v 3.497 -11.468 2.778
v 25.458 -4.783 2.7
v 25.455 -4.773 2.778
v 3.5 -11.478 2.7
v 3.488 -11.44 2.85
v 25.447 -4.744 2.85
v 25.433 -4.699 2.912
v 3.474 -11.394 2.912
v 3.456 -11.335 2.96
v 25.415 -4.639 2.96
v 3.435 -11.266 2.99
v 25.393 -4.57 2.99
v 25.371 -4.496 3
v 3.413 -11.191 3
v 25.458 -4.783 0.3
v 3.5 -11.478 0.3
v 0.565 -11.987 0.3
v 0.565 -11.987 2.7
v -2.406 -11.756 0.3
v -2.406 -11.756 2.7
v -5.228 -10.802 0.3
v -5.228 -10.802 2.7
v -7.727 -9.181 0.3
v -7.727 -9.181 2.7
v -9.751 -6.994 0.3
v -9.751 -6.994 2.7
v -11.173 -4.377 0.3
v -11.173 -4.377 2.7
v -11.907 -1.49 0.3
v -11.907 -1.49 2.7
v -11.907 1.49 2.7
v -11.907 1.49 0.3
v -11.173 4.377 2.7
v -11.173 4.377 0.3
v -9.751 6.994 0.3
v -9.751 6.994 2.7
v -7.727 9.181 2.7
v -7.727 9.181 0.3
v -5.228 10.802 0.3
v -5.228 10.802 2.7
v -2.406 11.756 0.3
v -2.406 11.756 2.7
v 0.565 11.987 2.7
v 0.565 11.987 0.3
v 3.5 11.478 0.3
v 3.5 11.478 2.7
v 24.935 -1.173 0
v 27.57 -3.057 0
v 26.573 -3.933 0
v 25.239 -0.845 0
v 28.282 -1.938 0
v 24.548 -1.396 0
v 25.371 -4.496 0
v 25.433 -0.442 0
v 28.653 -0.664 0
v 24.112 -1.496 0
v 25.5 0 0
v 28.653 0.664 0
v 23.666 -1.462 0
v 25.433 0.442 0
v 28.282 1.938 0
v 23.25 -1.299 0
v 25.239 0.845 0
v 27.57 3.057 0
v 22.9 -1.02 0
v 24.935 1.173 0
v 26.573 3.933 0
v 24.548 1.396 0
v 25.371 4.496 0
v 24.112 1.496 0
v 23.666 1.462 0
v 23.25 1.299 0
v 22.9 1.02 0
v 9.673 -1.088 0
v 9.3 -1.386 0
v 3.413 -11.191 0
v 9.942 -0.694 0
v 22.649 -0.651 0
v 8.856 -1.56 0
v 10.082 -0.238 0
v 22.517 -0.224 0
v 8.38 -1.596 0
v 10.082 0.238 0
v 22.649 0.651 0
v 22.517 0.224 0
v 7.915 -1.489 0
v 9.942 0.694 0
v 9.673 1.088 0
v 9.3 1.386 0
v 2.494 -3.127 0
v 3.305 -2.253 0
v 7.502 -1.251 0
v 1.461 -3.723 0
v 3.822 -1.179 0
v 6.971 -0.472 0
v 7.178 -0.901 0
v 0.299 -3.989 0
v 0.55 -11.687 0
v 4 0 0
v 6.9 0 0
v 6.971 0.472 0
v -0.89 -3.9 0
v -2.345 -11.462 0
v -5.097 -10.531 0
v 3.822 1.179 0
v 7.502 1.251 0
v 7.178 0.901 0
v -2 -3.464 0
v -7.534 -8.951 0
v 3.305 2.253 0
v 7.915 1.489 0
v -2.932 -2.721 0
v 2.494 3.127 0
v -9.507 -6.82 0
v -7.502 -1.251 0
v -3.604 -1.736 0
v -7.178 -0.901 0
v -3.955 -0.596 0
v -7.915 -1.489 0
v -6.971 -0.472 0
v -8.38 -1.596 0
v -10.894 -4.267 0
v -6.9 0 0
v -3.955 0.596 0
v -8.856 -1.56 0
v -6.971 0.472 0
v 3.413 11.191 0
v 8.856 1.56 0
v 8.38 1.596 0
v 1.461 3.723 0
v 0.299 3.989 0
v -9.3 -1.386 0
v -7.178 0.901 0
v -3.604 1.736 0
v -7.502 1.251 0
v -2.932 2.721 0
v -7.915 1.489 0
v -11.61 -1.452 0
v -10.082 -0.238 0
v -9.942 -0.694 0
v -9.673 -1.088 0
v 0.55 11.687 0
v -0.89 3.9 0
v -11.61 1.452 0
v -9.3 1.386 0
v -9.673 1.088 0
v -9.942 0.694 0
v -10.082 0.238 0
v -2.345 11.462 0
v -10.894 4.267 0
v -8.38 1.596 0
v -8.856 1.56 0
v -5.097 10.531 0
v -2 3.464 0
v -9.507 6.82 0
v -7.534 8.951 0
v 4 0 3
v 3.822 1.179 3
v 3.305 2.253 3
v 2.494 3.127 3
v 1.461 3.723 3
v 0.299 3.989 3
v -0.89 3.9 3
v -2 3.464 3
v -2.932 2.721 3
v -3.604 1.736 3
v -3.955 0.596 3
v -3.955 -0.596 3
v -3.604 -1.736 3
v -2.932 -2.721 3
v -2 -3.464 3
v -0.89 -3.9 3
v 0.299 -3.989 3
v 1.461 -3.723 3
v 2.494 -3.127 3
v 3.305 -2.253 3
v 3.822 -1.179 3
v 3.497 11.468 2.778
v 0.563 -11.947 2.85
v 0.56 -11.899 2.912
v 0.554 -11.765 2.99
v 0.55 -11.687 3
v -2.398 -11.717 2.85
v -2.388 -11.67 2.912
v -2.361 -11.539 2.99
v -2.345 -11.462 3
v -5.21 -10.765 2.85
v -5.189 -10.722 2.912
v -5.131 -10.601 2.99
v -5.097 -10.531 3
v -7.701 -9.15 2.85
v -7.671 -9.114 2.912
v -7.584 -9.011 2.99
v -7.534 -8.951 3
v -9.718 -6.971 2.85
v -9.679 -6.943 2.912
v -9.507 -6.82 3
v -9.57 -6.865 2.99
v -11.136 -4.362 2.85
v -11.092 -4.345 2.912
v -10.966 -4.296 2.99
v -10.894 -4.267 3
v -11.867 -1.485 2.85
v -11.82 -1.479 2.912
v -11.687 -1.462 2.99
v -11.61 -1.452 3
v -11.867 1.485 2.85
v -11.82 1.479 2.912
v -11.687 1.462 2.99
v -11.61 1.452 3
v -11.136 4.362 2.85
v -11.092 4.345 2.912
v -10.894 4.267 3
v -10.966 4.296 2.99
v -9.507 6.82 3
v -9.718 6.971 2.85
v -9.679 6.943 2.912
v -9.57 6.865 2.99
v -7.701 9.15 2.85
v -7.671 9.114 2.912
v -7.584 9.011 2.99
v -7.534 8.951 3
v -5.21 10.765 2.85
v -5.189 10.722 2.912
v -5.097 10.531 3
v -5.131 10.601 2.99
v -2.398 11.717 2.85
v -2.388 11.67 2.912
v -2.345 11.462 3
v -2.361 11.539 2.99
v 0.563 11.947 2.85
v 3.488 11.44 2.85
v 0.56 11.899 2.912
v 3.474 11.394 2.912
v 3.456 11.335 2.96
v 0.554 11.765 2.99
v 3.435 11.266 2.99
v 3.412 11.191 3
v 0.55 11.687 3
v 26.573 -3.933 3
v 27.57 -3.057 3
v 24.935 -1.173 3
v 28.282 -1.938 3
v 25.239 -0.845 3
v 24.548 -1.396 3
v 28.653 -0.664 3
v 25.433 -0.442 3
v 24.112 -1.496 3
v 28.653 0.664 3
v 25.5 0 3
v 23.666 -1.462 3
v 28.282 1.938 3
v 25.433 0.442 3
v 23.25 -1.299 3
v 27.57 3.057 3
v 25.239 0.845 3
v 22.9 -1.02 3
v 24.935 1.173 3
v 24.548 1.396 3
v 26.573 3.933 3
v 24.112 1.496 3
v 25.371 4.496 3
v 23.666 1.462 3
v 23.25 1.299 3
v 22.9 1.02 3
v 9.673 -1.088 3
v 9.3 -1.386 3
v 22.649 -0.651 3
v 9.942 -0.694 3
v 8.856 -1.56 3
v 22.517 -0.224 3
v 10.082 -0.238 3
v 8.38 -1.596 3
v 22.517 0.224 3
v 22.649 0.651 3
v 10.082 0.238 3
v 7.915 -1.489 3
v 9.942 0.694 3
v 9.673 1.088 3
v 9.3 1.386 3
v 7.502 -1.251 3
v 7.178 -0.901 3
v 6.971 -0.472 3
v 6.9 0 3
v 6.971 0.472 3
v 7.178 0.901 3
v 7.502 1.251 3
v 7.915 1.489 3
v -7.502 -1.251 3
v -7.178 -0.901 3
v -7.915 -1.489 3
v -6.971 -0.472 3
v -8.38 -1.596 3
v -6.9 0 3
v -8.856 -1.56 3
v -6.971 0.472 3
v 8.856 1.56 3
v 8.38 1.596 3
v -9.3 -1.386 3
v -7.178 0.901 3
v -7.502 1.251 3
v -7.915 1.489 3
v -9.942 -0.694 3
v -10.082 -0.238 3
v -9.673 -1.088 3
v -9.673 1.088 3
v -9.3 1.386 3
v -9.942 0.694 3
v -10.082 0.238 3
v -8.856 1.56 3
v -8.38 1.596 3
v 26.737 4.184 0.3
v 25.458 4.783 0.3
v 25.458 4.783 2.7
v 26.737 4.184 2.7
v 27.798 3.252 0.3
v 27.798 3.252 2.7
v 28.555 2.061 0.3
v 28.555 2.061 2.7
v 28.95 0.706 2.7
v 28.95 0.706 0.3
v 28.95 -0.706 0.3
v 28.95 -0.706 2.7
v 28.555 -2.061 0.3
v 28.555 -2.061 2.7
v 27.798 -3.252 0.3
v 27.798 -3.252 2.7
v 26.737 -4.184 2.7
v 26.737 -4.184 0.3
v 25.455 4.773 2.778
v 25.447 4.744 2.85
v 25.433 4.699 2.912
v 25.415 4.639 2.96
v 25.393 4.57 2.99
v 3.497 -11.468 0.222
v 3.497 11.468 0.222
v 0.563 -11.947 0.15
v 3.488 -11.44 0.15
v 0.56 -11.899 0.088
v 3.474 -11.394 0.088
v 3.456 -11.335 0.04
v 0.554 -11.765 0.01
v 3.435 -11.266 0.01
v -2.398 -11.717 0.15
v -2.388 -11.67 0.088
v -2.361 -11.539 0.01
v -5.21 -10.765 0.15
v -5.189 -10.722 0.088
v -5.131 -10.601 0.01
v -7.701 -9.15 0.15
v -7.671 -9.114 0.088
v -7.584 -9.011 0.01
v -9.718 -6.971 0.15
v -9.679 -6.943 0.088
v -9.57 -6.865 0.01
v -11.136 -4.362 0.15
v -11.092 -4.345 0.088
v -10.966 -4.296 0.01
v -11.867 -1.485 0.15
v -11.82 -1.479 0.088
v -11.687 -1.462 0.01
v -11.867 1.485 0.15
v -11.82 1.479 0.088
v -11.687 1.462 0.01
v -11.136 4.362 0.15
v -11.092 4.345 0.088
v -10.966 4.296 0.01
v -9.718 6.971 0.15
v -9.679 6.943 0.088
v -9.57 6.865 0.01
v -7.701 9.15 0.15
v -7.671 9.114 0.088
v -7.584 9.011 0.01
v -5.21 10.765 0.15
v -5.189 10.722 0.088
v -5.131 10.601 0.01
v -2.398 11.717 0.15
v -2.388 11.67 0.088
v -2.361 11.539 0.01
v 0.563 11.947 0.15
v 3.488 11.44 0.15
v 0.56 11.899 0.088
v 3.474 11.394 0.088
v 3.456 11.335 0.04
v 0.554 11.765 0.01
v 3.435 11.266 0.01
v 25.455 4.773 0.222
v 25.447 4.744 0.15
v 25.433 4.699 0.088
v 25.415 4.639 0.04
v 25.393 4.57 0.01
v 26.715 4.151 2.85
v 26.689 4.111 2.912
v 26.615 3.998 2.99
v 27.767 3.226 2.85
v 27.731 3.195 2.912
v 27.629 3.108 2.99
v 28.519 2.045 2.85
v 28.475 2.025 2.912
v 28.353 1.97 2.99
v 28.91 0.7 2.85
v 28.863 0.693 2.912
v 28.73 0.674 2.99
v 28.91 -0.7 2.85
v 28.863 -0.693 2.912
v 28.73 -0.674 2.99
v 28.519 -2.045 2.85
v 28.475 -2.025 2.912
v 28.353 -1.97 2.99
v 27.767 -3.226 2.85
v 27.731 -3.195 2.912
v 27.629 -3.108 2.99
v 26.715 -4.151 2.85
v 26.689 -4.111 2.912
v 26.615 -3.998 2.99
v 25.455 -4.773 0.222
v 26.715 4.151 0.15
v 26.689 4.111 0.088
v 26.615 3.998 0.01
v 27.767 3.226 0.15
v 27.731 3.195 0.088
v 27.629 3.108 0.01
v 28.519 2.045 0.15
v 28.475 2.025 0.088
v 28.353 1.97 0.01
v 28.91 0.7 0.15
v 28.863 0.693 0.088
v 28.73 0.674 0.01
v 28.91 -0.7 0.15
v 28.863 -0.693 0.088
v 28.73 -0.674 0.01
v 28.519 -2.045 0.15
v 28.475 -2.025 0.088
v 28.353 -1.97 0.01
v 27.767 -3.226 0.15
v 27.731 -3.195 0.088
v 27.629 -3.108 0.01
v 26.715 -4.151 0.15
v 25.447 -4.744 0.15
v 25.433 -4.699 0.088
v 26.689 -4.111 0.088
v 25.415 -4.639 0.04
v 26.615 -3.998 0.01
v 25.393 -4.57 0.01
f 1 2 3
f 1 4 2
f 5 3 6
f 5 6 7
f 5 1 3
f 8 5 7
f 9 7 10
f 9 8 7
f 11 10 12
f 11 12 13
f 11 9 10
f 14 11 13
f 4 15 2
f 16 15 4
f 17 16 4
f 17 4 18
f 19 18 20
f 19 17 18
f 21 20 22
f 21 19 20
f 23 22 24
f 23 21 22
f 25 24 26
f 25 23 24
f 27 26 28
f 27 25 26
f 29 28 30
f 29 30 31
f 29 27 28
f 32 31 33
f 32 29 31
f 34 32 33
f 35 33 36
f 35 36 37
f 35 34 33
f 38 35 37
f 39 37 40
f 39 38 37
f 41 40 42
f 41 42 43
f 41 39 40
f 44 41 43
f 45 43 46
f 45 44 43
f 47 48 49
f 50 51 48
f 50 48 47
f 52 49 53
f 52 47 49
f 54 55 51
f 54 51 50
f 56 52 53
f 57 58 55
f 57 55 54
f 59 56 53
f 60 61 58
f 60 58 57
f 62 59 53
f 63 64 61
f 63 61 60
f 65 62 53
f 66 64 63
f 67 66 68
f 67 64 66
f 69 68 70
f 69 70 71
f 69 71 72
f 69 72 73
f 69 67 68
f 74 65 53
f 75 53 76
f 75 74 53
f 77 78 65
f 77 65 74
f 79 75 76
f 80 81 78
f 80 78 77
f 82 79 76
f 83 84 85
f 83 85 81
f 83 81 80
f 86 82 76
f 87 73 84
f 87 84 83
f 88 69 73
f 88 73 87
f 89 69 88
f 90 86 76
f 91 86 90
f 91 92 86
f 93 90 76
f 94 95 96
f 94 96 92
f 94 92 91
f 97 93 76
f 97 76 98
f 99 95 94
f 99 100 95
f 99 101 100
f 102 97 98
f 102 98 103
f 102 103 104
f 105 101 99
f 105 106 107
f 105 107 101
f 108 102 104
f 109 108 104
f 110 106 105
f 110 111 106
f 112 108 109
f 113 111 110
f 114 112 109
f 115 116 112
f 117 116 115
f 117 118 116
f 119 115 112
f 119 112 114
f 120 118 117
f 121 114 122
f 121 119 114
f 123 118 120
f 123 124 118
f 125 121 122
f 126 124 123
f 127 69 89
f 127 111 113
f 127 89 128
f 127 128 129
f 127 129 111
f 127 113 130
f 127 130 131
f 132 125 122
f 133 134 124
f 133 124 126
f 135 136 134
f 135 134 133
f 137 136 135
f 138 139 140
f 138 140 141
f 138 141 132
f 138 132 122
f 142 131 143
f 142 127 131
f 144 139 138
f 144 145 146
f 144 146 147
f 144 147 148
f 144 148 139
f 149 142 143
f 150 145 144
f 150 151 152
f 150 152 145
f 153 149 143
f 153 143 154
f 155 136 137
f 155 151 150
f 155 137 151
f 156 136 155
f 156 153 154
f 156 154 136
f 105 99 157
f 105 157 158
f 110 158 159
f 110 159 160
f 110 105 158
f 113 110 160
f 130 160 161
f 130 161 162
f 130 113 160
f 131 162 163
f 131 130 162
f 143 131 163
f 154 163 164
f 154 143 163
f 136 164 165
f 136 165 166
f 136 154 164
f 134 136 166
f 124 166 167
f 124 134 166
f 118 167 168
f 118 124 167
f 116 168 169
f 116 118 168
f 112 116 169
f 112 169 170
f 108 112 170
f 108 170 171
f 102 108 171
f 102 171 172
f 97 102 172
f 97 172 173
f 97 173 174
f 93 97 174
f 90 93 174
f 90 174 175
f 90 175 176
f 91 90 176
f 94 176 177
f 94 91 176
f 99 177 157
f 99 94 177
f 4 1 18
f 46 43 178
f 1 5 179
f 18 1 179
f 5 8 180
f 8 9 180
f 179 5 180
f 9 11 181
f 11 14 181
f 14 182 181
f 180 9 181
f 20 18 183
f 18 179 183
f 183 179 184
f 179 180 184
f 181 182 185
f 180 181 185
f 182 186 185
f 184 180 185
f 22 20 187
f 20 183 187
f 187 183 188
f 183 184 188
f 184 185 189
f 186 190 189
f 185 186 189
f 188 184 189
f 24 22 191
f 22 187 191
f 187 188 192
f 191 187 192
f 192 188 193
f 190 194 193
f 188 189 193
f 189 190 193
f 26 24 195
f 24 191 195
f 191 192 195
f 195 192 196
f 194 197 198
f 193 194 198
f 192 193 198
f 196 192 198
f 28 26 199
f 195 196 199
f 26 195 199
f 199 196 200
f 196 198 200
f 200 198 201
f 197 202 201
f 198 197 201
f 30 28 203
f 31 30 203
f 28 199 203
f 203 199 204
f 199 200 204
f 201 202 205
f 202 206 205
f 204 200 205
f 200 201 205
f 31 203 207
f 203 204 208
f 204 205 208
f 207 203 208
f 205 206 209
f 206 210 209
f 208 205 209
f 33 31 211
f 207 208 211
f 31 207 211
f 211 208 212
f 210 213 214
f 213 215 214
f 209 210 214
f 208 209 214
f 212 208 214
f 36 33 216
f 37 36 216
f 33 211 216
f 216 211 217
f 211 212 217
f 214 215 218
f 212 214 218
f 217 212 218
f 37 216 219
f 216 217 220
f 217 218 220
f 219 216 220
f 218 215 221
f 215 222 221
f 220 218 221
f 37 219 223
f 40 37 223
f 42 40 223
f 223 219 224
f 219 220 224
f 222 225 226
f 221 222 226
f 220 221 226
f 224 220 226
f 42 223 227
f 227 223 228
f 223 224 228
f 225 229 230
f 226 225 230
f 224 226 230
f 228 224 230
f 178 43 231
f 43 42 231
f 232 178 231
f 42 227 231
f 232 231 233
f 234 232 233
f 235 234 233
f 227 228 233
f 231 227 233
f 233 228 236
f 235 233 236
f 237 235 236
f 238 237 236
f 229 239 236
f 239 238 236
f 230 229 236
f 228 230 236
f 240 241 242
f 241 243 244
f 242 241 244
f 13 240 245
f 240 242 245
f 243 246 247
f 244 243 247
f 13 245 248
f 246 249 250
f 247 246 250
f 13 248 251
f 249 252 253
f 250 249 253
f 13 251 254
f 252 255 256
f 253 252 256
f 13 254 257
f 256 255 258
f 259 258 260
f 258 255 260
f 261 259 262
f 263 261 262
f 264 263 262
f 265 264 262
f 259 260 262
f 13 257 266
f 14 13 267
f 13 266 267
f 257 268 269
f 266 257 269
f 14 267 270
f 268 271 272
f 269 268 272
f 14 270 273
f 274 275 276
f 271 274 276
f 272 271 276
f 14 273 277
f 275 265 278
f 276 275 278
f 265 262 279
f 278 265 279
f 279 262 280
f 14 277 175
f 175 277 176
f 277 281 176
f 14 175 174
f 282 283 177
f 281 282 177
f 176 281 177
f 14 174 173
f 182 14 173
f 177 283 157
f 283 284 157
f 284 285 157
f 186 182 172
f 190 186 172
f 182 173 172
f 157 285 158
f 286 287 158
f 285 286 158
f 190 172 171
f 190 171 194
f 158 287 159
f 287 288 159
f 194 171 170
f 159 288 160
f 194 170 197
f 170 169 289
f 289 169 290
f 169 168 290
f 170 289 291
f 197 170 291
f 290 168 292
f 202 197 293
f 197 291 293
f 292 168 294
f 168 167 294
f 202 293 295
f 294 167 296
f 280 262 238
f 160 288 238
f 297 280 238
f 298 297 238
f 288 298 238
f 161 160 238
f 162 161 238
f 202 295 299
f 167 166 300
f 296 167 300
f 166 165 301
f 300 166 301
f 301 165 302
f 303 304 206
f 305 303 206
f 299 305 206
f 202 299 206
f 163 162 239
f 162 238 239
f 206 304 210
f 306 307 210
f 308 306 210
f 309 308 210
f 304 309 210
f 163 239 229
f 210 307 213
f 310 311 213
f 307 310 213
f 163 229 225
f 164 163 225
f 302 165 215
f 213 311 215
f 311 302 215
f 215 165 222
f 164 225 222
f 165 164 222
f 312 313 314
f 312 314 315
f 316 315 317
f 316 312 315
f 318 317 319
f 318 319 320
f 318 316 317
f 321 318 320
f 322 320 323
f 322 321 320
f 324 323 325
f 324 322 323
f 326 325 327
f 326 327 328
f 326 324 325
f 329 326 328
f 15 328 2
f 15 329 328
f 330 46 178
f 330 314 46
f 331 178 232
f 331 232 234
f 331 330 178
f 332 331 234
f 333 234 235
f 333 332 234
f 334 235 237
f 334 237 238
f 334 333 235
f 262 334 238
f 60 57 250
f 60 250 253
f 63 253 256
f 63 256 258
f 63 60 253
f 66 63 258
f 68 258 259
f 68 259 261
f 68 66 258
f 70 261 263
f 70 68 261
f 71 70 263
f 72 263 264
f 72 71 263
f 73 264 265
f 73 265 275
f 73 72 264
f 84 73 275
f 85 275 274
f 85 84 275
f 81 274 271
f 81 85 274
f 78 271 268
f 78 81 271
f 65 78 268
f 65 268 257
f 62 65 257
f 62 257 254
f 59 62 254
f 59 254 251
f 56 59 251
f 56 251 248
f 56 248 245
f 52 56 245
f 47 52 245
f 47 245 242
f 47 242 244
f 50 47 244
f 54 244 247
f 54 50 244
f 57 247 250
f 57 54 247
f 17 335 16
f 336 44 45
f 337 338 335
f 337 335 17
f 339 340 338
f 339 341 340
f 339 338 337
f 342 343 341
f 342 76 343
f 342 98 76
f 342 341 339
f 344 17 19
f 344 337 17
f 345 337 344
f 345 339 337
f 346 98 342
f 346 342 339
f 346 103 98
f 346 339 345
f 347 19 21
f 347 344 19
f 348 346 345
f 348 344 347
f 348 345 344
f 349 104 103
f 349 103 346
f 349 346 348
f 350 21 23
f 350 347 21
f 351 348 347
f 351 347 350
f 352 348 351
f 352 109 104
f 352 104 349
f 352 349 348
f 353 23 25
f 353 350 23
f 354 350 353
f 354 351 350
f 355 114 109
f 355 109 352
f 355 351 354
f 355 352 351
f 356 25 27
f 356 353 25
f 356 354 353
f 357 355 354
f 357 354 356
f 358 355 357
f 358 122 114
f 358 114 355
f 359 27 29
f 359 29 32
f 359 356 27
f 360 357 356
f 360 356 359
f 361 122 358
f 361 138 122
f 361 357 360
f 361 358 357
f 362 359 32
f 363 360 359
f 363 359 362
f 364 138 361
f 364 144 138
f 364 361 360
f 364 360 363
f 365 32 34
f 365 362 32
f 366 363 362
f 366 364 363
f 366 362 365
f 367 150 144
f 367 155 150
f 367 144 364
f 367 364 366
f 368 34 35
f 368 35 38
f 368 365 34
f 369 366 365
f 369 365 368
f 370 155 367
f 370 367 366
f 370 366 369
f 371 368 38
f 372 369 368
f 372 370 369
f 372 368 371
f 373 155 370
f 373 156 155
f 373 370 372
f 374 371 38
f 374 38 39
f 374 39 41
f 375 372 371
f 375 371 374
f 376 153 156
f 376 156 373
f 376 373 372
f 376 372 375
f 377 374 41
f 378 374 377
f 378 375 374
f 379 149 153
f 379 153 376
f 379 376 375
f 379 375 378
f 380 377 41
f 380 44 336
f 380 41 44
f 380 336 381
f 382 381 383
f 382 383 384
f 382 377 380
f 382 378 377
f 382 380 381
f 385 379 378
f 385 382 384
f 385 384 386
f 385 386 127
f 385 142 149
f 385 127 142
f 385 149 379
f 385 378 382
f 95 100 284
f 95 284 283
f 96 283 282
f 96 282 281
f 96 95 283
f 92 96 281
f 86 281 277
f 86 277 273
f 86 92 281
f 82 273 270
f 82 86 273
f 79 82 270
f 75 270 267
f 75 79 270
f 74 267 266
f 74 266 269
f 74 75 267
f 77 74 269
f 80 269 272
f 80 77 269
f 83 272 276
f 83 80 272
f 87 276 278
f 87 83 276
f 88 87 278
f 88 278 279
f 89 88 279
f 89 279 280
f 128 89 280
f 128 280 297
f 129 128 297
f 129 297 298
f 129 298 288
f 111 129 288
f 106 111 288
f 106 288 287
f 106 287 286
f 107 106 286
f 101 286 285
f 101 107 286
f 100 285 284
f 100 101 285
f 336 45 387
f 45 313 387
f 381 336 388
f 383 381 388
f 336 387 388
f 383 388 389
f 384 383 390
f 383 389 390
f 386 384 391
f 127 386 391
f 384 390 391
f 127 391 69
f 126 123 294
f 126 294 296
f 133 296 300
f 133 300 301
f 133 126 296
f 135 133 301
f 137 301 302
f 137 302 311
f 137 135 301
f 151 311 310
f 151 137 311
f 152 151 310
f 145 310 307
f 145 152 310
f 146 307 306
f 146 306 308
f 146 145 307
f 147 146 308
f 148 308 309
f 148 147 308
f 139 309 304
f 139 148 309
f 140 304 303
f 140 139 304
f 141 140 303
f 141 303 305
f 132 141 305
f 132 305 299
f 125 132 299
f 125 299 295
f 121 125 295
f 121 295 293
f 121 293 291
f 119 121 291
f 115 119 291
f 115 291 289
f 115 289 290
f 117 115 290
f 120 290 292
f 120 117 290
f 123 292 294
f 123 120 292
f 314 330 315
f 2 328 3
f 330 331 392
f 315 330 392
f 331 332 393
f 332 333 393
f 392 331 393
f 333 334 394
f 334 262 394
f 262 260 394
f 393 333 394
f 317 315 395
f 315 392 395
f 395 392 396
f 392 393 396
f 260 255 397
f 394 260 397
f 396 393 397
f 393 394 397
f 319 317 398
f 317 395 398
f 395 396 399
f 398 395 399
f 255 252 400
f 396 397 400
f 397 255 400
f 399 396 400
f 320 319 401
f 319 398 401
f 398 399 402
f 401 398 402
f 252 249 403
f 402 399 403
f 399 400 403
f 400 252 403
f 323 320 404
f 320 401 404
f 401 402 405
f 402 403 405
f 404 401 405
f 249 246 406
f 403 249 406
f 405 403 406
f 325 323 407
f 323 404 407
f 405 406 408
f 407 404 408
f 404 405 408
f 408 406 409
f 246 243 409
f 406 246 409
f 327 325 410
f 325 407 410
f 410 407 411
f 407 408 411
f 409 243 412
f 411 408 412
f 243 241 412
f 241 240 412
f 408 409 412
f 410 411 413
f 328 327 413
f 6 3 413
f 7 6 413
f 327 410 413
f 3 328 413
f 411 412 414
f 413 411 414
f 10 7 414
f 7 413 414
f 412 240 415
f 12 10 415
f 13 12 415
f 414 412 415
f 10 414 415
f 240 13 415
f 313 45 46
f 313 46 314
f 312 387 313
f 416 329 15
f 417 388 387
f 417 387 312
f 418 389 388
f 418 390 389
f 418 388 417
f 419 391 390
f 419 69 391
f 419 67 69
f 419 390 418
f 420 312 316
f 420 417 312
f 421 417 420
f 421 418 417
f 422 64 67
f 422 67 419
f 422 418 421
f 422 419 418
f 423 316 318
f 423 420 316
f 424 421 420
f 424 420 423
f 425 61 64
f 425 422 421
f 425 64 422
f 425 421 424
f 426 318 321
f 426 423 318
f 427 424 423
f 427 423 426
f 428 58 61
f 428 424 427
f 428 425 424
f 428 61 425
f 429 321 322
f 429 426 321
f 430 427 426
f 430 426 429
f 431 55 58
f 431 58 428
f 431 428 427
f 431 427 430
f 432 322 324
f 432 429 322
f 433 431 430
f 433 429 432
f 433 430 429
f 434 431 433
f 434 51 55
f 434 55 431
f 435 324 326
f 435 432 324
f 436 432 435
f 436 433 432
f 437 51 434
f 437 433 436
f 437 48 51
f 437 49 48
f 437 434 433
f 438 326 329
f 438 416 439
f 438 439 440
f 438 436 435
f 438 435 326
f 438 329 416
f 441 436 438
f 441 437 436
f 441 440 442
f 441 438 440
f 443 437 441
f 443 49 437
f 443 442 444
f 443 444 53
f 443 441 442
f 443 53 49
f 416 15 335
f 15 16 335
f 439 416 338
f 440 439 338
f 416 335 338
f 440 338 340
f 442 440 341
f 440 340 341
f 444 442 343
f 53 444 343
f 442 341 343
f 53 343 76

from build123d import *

# Parameters (mm, degrees)
ESQUISSE1_R        = 4
ESQUISSE1_R_2      = 1.5
ESQUISSE1_R_3      = 1.6
BOSS_EXTRU_1_DEPTH = 3
CONG_2_R           = 0.3


with BuildPart() as part:
    # Esquisse1 → Boss.-Extru.1 (new body)
    with BuildSketch(Plane.XY):
        with BuildLine():
            Line((3.5, 11.478240283), (25.458333333, 4.782600118))
            ThreePointArc((25.458333333, 4.782600118), (29, 0), (25.458333333, -4.782600118))
            Line((25.458333333, -4.782600118), (3.5, -11.478240283))
            ThreePointArc((3.5, -11.478240283), (-12, 0), (3.5, 11.478240283))
        make_face()
        Circle(ESQUISSE1_R, mode=Mode.SUBTRACT)
        with Locations((24, 0)):
            Circle(ESQUISSE1_R_2, mode=Mode.SUBTRACT)
        with Locations((-8.5, 0)):
            Circle(ESQUISSE1_R_3, mode=Mode.SUBTRACT)
        with Locations(Location((8.5, 0, 0), (0, 0, 180))):
            Circle(ESQUISSE1_R_3, mode=Mode.SUBTRACT)
    extrude(amount=BOSS_EXTRU_1_DEPTH)

    # Congé2
    cong_2_edges = [part.edges().sort_by_distance(p)[0] for p in [
        (29, 0, 3),
        (14.479166667, 8.130420201, 3),
        (-12, 0, 3),
        (14.479166667, 8.130420201, 0),
        (29, 0, 0),
        (14.479166667, -8.130420201, 0),
        (-12, 0, 0),
        (14.479166667, -8.130420201, 3),
    ]]
    fillet(cong_2_edges, radius=CONG_2_R)


solid = part.part
